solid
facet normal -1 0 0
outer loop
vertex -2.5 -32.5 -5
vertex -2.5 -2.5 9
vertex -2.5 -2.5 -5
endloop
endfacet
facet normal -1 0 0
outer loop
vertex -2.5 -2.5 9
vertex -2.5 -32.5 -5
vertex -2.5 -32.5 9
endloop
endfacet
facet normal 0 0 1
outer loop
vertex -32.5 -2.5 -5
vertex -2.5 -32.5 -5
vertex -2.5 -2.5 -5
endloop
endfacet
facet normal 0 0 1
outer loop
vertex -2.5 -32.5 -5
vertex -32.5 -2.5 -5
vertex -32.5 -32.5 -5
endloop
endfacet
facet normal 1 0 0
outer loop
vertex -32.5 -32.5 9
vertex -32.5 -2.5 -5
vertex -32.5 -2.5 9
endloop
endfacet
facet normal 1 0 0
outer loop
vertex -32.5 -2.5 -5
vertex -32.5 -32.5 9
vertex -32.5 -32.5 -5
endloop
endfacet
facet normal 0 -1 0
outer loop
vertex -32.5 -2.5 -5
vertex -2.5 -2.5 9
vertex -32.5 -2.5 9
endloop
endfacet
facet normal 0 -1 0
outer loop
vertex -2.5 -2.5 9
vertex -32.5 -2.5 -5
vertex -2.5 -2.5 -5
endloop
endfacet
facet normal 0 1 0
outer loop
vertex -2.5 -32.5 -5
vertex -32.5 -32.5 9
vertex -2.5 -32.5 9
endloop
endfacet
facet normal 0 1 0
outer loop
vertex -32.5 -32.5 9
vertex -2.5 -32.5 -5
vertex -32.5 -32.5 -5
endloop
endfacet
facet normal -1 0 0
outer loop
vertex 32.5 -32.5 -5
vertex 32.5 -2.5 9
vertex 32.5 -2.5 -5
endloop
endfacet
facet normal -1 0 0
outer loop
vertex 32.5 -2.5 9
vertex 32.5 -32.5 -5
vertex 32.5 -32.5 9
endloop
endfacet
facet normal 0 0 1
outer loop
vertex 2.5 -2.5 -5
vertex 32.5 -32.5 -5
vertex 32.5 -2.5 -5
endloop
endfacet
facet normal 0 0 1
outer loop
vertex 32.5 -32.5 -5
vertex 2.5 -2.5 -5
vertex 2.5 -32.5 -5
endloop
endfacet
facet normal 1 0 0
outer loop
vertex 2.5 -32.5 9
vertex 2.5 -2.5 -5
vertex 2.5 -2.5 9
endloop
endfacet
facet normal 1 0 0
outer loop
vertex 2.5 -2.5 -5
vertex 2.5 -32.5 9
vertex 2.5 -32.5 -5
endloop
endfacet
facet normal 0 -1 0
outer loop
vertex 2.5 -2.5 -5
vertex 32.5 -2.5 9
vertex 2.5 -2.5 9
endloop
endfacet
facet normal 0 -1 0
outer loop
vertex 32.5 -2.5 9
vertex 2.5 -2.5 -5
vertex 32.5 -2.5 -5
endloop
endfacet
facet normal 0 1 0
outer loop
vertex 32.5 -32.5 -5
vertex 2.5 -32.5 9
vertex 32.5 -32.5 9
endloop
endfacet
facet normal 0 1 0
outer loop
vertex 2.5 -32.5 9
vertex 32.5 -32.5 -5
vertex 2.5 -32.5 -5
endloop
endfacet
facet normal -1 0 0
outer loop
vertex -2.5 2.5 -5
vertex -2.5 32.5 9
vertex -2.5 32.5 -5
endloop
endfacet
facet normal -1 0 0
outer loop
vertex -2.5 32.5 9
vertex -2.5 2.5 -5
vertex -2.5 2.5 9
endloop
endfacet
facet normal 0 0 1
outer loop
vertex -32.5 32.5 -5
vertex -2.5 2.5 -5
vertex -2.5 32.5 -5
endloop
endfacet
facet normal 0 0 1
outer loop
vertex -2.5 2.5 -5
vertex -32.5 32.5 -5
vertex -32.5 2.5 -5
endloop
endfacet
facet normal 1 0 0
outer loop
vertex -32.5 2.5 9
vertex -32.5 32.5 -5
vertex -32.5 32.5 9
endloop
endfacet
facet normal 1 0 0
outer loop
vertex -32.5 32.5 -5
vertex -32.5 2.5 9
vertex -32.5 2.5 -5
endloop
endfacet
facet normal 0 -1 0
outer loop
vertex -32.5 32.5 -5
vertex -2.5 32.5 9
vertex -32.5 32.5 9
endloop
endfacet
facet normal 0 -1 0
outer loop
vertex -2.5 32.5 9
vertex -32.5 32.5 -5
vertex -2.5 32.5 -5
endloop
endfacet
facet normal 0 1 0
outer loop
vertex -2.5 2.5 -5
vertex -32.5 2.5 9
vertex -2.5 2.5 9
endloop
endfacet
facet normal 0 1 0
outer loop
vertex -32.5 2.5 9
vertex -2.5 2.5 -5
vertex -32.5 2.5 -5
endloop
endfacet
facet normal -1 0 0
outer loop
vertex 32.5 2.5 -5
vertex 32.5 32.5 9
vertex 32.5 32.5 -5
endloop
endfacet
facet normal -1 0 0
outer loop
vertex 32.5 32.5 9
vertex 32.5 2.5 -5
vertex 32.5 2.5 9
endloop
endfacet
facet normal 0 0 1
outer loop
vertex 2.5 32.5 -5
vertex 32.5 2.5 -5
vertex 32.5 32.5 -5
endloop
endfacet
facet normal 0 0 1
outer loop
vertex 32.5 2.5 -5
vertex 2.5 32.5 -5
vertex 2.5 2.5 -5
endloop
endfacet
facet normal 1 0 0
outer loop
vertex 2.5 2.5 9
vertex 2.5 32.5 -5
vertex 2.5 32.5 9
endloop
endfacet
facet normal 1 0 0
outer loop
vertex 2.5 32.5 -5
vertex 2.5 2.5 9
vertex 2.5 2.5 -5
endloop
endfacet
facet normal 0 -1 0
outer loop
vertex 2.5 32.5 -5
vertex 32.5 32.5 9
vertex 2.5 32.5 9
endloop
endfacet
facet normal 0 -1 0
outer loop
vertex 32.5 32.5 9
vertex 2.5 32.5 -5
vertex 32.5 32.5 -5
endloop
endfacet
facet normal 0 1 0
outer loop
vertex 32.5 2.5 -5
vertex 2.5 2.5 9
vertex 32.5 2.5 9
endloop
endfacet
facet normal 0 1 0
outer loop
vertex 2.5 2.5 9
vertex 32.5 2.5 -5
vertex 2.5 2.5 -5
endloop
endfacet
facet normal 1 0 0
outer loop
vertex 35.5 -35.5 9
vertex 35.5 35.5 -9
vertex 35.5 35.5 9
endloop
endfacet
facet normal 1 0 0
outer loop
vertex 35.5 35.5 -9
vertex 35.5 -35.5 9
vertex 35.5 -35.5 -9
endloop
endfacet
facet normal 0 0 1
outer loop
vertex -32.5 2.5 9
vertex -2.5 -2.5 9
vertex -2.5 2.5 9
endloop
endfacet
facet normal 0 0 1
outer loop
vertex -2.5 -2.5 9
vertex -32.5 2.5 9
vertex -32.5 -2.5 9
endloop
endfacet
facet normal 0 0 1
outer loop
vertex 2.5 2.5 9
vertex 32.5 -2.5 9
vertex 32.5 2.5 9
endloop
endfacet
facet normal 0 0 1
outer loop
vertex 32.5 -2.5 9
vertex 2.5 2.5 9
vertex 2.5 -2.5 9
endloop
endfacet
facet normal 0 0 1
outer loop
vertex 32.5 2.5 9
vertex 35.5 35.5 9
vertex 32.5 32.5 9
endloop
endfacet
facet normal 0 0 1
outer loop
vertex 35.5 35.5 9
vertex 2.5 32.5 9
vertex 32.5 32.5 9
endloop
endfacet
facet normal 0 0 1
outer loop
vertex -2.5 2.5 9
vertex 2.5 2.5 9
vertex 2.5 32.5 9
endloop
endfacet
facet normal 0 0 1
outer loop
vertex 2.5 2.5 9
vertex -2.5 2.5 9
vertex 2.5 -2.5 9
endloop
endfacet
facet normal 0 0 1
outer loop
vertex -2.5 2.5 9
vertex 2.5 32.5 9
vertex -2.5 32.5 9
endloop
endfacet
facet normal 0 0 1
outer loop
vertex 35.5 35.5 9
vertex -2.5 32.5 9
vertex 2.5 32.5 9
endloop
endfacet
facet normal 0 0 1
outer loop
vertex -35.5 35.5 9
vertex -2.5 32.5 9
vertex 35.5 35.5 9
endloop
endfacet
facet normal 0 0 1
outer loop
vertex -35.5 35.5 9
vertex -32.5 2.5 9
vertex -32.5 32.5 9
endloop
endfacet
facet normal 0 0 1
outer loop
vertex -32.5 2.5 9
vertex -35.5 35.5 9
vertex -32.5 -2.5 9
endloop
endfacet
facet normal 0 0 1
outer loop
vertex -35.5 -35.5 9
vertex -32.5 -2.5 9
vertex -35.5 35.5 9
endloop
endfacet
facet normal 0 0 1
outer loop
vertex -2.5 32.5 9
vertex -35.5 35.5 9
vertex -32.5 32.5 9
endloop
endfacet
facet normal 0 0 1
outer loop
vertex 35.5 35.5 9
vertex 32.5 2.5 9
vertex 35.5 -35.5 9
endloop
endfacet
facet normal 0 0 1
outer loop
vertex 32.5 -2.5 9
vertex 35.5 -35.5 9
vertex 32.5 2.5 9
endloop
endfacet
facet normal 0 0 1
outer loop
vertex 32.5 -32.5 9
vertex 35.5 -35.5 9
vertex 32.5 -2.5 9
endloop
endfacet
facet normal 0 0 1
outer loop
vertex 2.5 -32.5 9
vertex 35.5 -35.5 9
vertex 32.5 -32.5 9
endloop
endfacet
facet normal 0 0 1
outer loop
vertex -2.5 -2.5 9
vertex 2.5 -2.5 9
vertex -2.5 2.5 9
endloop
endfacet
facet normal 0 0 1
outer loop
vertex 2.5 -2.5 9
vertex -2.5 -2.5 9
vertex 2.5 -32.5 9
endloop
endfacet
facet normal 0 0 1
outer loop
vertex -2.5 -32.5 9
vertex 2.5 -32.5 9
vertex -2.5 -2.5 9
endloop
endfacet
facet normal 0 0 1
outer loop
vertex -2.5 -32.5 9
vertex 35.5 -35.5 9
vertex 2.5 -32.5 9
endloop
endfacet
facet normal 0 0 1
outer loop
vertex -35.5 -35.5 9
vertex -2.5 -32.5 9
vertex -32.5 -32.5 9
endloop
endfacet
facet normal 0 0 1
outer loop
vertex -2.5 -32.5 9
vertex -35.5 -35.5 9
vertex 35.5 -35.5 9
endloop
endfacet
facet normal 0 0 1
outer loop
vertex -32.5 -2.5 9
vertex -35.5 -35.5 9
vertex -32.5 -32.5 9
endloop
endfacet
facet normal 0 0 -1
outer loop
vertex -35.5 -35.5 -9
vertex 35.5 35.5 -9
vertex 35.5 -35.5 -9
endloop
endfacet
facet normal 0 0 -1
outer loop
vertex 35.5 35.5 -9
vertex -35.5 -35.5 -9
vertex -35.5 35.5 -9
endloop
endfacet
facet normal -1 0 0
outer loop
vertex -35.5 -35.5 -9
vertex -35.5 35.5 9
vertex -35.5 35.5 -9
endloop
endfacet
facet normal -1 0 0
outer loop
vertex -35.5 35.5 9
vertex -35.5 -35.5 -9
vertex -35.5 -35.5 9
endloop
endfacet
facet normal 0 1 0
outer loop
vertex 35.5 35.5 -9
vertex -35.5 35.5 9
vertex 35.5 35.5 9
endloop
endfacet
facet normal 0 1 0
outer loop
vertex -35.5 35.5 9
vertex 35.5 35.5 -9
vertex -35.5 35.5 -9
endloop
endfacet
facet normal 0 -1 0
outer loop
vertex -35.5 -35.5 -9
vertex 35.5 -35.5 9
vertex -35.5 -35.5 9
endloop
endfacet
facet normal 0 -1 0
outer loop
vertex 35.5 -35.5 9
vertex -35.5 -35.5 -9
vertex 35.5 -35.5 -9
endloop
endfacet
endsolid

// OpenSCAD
$fn = 32;

// ----------------------------------------------------------------------
// Pocket plate 71 x 71 x 18
// 2 x 2 pockets 30 mm square, 14 mm deep
// ----------------------------------------------------------------------

// --- parameters (mm) ---
thickness = 18;  // plate thickness
floor_t = 4;     // material left under each pocket
pocket = 30;     // pocket side length
pitch_x = 35;    // pocket pitch along X
pitch_y = 35;    // pocket pitch along Y
cols = 2;        // pockets per row
rows = 2;        // rows of pockets

// --- derived feature positions (mm) ---
depth = thickness - floor_t;        // = 14   pocket depth, down to the floor
span_x = (cols - 1) * pitch_x;      // = 35   distance between outer pockets
span_y = (rows - 1) * pitch_y;      // = 35   distance between outer pocket rows
origin_x = -span_x / 2;             // = -17.5   X of the first pocket
origin_y = -span_y / 2;             // = -17.5   Y of the first pocket
plate = [span_x + pocket + 6, span_y + pocket + 6, thickness];  // = [71, 71, 18]   overall size: pockets plus 3 mm of wall on each side
feature_centers = [
  [origin_x + 0 * pitch_x, origin_y + 0 * pitch_y],
  [origin_x + 1 * pitch_x, origin_y + 0 * pitch_y],
  [origin_x + 0 * pitch_x, origin_y + 1 * pitch_y],
  [origin_x + 1 * pitch_x, origin_y + 1 * pitch_y]
];   // pocket centres, used verbatim by the cutter loop

// plate outline, then one pocket per centre in feature_centers
difference() {
  cube(plate, center = true);
  for (centre = feature_centers)
    translate([centre[0] - pocket / 2, centre[1] - pocket / 2, plate[2] / 2 - depth])
      cube([pocket, pocket, depth + 1]);  // centred on the declared pocket centre
}
